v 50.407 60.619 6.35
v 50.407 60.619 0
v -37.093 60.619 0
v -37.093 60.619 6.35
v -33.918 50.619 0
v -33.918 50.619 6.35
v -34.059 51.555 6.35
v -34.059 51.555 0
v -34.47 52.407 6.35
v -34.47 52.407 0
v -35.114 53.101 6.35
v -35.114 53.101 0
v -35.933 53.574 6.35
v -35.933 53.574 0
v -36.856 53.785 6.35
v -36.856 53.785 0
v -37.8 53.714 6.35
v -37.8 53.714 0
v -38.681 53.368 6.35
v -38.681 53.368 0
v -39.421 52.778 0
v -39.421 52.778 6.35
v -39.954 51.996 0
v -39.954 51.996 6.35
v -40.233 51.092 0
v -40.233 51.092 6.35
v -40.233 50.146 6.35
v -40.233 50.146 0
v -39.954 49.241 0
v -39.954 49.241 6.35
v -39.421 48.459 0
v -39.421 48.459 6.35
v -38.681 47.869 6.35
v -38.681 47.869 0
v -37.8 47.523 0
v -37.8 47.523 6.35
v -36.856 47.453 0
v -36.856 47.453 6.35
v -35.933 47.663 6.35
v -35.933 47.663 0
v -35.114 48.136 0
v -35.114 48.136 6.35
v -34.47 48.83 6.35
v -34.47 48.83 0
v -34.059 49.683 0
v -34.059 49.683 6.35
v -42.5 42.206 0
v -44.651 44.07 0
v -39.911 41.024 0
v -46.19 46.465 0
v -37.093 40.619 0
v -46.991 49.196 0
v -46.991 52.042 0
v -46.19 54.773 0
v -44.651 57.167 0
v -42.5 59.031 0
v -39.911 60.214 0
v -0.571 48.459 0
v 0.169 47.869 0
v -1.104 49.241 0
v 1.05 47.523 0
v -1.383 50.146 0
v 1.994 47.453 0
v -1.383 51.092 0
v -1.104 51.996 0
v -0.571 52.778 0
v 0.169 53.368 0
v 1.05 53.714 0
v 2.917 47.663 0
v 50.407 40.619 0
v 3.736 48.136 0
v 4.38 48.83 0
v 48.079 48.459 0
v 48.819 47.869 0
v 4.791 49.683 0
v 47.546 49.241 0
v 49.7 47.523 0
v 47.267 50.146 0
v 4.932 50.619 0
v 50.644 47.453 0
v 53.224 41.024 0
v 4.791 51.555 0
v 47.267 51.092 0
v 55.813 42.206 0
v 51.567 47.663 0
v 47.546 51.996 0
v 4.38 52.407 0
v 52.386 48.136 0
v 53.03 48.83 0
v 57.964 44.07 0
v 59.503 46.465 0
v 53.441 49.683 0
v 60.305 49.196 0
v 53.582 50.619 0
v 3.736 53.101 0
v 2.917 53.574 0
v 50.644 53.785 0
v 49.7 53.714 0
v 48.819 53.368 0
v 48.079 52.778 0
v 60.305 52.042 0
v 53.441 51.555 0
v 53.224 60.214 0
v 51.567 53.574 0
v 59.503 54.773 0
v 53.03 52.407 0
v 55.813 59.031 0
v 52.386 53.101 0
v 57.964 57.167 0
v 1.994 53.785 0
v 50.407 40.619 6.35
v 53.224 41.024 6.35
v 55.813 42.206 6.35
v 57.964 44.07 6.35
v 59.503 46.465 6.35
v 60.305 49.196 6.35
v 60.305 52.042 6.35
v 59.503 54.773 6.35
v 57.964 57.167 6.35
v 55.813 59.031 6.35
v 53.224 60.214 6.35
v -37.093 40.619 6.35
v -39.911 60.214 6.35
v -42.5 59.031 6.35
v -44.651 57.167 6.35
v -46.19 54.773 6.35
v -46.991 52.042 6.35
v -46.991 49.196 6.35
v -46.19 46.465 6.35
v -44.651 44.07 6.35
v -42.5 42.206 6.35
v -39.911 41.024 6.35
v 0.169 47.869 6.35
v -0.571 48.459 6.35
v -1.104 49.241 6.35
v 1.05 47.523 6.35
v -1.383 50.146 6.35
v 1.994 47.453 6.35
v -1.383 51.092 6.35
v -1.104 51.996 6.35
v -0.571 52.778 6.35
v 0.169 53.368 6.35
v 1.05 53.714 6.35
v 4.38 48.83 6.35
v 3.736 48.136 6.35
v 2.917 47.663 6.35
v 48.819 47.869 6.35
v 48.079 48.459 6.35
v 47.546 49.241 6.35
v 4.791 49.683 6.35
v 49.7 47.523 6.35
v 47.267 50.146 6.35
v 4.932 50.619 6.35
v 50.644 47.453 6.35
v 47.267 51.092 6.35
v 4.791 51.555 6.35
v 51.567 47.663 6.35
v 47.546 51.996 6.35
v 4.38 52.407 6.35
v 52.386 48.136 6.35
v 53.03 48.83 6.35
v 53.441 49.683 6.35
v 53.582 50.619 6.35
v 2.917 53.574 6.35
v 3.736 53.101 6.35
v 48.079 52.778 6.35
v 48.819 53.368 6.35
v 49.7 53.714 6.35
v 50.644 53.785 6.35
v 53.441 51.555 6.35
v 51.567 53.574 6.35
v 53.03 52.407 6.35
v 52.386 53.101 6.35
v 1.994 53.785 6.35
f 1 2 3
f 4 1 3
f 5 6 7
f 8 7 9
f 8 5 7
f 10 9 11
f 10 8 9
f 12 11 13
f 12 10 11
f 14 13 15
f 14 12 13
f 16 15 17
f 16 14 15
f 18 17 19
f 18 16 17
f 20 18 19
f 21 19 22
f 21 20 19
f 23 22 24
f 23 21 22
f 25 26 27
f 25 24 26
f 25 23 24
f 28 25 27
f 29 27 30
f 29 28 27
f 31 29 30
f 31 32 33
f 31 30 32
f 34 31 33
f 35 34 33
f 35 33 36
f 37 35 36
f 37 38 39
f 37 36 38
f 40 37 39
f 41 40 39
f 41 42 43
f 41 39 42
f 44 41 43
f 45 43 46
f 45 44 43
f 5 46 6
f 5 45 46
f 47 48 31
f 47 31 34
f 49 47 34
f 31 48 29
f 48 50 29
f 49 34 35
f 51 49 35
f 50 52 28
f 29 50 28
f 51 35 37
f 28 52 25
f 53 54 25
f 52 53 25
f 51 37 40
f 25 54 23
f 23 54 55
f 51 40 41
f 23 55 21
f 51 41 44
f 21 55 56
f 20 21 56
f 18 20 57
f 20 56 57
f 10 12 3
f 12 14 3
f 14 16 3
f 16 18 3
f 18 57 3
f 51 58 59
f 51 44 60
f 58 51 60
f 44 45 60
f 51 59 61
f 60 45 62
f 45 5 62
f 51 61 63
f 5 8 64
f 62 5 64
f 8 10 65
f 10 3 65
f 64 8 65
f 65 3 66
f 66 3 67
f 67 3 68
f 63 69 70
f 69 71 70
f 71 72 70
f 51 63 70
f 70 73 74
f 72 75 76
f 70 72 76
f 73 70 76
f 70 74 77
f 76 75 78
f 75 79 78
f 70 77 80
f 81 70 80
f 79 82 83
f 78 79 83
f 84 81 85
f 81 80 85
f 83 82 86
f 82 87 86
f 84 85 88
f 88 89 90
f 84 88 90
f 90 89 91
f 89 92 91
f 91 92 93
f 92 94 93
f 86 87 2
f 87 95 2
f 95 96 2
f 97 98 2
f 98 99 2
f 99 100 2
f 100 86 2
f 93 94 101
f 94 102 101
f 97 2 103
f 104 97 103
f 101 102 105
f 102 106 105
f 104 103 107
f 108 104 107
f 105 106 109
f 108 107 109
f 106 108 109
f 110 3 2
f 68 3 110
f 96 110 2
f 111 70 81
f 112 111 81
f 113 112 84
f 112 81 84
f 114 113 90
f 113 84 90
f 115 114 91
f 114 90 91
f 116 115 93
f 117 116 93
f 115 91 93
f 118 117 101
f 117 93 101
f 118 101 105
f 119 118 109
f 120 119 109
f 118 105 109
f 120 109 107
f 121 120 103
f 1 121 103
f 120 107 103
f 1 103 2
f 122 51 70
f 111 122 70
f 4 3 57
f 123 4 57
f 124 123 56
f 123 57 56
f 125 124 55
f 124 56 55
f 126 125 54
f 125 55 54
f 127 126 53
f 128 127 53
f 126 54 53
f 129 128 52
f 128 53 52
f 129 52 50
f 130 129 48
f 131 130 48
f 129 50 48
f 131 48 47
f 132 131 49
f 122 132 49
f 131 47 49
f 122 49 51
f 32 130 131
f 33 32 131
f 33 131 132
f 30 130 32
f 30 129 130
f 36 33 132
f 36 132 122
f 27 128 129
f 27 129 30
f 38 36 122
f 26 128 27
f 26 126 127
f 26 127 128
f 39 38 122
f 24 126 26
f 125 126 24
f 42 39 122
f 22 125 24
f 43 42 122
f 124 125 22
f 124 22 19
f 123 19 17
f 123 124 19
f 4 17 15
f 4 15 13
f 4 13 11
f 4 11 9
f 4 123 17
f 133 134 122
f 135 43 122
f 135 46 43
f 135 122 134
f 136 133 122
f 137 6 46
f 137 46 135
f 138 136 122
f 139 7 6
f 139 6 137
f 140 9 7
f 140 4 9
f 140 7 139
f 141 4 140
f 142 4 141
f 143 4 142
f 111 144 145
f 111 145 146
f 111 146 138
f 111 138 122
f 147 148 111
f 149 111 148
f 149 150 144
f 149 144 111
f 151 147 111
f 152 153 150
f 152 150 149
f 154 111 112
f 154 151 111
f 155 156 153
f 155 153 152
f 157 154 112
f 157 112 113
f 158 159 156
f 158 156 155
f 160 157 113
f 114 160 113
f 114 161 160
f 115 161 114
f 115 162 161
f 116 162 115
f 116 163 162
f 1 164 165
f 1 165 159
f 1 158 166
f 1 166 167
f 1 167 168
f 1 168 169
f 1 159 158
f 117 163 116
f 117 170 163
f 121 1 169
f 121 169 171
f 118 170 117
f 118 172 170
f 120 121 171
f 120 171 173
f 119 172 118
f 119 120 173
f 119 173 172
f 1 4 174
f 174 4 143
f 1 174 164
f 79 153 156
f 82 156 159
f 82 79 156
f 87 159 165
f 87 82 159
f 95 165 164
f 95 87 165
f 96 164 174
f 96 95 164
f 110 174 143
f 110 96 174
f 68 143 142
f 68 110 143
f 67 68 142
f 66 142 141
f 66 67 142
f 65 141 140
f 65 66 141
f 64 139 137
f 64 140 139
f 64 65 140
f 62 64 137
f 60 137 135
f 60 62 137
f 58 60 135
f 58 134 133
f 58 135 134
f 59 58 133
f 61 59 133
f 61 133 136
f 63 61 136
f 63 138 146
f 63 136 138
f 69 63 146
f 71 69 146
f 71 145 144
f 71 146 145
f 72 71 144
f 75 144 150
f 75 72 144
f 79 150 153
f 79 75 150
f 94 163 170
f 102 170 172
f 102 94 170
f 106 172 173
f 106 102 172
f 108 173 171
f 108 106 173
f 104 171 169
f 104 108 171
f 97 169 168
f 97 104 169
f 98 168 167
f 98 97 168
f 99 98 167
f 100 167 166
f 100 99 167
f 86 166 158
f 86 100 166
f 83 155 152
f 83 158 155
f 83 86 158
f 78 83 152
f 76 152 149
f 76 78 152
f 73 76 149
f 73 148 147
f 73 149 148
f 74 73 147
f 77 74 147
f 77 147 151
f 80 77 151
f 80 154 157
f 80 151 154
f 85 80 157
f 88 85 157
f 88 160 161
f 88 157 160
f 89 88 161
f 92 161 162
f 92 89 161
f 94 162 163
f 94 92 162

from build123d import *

# Parameters (mm, degrees)
F2_DEPTH = 6.35
F1_R     = 3.175
F3_DEPTH = 6.351


with BuildPart() as f2:
    # F0 (on Top) → F2 (new body)
    with BuildSketch(Plane.XY):
        with BuildLine():
            ThreePointArc((-37.093219, 60.618736), (-47.093219, 50.618736), (-37.093219, 40.618736))
            Line((-37.093219, 40.618736), (50.406781, 40.618736))
            ThreePointArc((50.406781, 40.618736), (60.406781, 50.618736), (50.406781, 60.618736))
            Line((50.406781, 60.618736), (-37.093219, 60.618736))
        make_face()
    extrude(amount=F2_DEPTH)

    # F1 (on face) → F3 (cut, through all)
    with BuildSketch(Plane.XY):
        with Locations((-37.093219, 50.618736)):
            Circle(F1_R)
        with Locations((50.406781, 50.618736)):
            Circle(F1_R)
        with Locations((1.756781, 50.618736)):
            Circle(F1_R)
    extrude(amount=F3_DEPTH, mode=Mode.SUBTRACT)


solid = f2.part
